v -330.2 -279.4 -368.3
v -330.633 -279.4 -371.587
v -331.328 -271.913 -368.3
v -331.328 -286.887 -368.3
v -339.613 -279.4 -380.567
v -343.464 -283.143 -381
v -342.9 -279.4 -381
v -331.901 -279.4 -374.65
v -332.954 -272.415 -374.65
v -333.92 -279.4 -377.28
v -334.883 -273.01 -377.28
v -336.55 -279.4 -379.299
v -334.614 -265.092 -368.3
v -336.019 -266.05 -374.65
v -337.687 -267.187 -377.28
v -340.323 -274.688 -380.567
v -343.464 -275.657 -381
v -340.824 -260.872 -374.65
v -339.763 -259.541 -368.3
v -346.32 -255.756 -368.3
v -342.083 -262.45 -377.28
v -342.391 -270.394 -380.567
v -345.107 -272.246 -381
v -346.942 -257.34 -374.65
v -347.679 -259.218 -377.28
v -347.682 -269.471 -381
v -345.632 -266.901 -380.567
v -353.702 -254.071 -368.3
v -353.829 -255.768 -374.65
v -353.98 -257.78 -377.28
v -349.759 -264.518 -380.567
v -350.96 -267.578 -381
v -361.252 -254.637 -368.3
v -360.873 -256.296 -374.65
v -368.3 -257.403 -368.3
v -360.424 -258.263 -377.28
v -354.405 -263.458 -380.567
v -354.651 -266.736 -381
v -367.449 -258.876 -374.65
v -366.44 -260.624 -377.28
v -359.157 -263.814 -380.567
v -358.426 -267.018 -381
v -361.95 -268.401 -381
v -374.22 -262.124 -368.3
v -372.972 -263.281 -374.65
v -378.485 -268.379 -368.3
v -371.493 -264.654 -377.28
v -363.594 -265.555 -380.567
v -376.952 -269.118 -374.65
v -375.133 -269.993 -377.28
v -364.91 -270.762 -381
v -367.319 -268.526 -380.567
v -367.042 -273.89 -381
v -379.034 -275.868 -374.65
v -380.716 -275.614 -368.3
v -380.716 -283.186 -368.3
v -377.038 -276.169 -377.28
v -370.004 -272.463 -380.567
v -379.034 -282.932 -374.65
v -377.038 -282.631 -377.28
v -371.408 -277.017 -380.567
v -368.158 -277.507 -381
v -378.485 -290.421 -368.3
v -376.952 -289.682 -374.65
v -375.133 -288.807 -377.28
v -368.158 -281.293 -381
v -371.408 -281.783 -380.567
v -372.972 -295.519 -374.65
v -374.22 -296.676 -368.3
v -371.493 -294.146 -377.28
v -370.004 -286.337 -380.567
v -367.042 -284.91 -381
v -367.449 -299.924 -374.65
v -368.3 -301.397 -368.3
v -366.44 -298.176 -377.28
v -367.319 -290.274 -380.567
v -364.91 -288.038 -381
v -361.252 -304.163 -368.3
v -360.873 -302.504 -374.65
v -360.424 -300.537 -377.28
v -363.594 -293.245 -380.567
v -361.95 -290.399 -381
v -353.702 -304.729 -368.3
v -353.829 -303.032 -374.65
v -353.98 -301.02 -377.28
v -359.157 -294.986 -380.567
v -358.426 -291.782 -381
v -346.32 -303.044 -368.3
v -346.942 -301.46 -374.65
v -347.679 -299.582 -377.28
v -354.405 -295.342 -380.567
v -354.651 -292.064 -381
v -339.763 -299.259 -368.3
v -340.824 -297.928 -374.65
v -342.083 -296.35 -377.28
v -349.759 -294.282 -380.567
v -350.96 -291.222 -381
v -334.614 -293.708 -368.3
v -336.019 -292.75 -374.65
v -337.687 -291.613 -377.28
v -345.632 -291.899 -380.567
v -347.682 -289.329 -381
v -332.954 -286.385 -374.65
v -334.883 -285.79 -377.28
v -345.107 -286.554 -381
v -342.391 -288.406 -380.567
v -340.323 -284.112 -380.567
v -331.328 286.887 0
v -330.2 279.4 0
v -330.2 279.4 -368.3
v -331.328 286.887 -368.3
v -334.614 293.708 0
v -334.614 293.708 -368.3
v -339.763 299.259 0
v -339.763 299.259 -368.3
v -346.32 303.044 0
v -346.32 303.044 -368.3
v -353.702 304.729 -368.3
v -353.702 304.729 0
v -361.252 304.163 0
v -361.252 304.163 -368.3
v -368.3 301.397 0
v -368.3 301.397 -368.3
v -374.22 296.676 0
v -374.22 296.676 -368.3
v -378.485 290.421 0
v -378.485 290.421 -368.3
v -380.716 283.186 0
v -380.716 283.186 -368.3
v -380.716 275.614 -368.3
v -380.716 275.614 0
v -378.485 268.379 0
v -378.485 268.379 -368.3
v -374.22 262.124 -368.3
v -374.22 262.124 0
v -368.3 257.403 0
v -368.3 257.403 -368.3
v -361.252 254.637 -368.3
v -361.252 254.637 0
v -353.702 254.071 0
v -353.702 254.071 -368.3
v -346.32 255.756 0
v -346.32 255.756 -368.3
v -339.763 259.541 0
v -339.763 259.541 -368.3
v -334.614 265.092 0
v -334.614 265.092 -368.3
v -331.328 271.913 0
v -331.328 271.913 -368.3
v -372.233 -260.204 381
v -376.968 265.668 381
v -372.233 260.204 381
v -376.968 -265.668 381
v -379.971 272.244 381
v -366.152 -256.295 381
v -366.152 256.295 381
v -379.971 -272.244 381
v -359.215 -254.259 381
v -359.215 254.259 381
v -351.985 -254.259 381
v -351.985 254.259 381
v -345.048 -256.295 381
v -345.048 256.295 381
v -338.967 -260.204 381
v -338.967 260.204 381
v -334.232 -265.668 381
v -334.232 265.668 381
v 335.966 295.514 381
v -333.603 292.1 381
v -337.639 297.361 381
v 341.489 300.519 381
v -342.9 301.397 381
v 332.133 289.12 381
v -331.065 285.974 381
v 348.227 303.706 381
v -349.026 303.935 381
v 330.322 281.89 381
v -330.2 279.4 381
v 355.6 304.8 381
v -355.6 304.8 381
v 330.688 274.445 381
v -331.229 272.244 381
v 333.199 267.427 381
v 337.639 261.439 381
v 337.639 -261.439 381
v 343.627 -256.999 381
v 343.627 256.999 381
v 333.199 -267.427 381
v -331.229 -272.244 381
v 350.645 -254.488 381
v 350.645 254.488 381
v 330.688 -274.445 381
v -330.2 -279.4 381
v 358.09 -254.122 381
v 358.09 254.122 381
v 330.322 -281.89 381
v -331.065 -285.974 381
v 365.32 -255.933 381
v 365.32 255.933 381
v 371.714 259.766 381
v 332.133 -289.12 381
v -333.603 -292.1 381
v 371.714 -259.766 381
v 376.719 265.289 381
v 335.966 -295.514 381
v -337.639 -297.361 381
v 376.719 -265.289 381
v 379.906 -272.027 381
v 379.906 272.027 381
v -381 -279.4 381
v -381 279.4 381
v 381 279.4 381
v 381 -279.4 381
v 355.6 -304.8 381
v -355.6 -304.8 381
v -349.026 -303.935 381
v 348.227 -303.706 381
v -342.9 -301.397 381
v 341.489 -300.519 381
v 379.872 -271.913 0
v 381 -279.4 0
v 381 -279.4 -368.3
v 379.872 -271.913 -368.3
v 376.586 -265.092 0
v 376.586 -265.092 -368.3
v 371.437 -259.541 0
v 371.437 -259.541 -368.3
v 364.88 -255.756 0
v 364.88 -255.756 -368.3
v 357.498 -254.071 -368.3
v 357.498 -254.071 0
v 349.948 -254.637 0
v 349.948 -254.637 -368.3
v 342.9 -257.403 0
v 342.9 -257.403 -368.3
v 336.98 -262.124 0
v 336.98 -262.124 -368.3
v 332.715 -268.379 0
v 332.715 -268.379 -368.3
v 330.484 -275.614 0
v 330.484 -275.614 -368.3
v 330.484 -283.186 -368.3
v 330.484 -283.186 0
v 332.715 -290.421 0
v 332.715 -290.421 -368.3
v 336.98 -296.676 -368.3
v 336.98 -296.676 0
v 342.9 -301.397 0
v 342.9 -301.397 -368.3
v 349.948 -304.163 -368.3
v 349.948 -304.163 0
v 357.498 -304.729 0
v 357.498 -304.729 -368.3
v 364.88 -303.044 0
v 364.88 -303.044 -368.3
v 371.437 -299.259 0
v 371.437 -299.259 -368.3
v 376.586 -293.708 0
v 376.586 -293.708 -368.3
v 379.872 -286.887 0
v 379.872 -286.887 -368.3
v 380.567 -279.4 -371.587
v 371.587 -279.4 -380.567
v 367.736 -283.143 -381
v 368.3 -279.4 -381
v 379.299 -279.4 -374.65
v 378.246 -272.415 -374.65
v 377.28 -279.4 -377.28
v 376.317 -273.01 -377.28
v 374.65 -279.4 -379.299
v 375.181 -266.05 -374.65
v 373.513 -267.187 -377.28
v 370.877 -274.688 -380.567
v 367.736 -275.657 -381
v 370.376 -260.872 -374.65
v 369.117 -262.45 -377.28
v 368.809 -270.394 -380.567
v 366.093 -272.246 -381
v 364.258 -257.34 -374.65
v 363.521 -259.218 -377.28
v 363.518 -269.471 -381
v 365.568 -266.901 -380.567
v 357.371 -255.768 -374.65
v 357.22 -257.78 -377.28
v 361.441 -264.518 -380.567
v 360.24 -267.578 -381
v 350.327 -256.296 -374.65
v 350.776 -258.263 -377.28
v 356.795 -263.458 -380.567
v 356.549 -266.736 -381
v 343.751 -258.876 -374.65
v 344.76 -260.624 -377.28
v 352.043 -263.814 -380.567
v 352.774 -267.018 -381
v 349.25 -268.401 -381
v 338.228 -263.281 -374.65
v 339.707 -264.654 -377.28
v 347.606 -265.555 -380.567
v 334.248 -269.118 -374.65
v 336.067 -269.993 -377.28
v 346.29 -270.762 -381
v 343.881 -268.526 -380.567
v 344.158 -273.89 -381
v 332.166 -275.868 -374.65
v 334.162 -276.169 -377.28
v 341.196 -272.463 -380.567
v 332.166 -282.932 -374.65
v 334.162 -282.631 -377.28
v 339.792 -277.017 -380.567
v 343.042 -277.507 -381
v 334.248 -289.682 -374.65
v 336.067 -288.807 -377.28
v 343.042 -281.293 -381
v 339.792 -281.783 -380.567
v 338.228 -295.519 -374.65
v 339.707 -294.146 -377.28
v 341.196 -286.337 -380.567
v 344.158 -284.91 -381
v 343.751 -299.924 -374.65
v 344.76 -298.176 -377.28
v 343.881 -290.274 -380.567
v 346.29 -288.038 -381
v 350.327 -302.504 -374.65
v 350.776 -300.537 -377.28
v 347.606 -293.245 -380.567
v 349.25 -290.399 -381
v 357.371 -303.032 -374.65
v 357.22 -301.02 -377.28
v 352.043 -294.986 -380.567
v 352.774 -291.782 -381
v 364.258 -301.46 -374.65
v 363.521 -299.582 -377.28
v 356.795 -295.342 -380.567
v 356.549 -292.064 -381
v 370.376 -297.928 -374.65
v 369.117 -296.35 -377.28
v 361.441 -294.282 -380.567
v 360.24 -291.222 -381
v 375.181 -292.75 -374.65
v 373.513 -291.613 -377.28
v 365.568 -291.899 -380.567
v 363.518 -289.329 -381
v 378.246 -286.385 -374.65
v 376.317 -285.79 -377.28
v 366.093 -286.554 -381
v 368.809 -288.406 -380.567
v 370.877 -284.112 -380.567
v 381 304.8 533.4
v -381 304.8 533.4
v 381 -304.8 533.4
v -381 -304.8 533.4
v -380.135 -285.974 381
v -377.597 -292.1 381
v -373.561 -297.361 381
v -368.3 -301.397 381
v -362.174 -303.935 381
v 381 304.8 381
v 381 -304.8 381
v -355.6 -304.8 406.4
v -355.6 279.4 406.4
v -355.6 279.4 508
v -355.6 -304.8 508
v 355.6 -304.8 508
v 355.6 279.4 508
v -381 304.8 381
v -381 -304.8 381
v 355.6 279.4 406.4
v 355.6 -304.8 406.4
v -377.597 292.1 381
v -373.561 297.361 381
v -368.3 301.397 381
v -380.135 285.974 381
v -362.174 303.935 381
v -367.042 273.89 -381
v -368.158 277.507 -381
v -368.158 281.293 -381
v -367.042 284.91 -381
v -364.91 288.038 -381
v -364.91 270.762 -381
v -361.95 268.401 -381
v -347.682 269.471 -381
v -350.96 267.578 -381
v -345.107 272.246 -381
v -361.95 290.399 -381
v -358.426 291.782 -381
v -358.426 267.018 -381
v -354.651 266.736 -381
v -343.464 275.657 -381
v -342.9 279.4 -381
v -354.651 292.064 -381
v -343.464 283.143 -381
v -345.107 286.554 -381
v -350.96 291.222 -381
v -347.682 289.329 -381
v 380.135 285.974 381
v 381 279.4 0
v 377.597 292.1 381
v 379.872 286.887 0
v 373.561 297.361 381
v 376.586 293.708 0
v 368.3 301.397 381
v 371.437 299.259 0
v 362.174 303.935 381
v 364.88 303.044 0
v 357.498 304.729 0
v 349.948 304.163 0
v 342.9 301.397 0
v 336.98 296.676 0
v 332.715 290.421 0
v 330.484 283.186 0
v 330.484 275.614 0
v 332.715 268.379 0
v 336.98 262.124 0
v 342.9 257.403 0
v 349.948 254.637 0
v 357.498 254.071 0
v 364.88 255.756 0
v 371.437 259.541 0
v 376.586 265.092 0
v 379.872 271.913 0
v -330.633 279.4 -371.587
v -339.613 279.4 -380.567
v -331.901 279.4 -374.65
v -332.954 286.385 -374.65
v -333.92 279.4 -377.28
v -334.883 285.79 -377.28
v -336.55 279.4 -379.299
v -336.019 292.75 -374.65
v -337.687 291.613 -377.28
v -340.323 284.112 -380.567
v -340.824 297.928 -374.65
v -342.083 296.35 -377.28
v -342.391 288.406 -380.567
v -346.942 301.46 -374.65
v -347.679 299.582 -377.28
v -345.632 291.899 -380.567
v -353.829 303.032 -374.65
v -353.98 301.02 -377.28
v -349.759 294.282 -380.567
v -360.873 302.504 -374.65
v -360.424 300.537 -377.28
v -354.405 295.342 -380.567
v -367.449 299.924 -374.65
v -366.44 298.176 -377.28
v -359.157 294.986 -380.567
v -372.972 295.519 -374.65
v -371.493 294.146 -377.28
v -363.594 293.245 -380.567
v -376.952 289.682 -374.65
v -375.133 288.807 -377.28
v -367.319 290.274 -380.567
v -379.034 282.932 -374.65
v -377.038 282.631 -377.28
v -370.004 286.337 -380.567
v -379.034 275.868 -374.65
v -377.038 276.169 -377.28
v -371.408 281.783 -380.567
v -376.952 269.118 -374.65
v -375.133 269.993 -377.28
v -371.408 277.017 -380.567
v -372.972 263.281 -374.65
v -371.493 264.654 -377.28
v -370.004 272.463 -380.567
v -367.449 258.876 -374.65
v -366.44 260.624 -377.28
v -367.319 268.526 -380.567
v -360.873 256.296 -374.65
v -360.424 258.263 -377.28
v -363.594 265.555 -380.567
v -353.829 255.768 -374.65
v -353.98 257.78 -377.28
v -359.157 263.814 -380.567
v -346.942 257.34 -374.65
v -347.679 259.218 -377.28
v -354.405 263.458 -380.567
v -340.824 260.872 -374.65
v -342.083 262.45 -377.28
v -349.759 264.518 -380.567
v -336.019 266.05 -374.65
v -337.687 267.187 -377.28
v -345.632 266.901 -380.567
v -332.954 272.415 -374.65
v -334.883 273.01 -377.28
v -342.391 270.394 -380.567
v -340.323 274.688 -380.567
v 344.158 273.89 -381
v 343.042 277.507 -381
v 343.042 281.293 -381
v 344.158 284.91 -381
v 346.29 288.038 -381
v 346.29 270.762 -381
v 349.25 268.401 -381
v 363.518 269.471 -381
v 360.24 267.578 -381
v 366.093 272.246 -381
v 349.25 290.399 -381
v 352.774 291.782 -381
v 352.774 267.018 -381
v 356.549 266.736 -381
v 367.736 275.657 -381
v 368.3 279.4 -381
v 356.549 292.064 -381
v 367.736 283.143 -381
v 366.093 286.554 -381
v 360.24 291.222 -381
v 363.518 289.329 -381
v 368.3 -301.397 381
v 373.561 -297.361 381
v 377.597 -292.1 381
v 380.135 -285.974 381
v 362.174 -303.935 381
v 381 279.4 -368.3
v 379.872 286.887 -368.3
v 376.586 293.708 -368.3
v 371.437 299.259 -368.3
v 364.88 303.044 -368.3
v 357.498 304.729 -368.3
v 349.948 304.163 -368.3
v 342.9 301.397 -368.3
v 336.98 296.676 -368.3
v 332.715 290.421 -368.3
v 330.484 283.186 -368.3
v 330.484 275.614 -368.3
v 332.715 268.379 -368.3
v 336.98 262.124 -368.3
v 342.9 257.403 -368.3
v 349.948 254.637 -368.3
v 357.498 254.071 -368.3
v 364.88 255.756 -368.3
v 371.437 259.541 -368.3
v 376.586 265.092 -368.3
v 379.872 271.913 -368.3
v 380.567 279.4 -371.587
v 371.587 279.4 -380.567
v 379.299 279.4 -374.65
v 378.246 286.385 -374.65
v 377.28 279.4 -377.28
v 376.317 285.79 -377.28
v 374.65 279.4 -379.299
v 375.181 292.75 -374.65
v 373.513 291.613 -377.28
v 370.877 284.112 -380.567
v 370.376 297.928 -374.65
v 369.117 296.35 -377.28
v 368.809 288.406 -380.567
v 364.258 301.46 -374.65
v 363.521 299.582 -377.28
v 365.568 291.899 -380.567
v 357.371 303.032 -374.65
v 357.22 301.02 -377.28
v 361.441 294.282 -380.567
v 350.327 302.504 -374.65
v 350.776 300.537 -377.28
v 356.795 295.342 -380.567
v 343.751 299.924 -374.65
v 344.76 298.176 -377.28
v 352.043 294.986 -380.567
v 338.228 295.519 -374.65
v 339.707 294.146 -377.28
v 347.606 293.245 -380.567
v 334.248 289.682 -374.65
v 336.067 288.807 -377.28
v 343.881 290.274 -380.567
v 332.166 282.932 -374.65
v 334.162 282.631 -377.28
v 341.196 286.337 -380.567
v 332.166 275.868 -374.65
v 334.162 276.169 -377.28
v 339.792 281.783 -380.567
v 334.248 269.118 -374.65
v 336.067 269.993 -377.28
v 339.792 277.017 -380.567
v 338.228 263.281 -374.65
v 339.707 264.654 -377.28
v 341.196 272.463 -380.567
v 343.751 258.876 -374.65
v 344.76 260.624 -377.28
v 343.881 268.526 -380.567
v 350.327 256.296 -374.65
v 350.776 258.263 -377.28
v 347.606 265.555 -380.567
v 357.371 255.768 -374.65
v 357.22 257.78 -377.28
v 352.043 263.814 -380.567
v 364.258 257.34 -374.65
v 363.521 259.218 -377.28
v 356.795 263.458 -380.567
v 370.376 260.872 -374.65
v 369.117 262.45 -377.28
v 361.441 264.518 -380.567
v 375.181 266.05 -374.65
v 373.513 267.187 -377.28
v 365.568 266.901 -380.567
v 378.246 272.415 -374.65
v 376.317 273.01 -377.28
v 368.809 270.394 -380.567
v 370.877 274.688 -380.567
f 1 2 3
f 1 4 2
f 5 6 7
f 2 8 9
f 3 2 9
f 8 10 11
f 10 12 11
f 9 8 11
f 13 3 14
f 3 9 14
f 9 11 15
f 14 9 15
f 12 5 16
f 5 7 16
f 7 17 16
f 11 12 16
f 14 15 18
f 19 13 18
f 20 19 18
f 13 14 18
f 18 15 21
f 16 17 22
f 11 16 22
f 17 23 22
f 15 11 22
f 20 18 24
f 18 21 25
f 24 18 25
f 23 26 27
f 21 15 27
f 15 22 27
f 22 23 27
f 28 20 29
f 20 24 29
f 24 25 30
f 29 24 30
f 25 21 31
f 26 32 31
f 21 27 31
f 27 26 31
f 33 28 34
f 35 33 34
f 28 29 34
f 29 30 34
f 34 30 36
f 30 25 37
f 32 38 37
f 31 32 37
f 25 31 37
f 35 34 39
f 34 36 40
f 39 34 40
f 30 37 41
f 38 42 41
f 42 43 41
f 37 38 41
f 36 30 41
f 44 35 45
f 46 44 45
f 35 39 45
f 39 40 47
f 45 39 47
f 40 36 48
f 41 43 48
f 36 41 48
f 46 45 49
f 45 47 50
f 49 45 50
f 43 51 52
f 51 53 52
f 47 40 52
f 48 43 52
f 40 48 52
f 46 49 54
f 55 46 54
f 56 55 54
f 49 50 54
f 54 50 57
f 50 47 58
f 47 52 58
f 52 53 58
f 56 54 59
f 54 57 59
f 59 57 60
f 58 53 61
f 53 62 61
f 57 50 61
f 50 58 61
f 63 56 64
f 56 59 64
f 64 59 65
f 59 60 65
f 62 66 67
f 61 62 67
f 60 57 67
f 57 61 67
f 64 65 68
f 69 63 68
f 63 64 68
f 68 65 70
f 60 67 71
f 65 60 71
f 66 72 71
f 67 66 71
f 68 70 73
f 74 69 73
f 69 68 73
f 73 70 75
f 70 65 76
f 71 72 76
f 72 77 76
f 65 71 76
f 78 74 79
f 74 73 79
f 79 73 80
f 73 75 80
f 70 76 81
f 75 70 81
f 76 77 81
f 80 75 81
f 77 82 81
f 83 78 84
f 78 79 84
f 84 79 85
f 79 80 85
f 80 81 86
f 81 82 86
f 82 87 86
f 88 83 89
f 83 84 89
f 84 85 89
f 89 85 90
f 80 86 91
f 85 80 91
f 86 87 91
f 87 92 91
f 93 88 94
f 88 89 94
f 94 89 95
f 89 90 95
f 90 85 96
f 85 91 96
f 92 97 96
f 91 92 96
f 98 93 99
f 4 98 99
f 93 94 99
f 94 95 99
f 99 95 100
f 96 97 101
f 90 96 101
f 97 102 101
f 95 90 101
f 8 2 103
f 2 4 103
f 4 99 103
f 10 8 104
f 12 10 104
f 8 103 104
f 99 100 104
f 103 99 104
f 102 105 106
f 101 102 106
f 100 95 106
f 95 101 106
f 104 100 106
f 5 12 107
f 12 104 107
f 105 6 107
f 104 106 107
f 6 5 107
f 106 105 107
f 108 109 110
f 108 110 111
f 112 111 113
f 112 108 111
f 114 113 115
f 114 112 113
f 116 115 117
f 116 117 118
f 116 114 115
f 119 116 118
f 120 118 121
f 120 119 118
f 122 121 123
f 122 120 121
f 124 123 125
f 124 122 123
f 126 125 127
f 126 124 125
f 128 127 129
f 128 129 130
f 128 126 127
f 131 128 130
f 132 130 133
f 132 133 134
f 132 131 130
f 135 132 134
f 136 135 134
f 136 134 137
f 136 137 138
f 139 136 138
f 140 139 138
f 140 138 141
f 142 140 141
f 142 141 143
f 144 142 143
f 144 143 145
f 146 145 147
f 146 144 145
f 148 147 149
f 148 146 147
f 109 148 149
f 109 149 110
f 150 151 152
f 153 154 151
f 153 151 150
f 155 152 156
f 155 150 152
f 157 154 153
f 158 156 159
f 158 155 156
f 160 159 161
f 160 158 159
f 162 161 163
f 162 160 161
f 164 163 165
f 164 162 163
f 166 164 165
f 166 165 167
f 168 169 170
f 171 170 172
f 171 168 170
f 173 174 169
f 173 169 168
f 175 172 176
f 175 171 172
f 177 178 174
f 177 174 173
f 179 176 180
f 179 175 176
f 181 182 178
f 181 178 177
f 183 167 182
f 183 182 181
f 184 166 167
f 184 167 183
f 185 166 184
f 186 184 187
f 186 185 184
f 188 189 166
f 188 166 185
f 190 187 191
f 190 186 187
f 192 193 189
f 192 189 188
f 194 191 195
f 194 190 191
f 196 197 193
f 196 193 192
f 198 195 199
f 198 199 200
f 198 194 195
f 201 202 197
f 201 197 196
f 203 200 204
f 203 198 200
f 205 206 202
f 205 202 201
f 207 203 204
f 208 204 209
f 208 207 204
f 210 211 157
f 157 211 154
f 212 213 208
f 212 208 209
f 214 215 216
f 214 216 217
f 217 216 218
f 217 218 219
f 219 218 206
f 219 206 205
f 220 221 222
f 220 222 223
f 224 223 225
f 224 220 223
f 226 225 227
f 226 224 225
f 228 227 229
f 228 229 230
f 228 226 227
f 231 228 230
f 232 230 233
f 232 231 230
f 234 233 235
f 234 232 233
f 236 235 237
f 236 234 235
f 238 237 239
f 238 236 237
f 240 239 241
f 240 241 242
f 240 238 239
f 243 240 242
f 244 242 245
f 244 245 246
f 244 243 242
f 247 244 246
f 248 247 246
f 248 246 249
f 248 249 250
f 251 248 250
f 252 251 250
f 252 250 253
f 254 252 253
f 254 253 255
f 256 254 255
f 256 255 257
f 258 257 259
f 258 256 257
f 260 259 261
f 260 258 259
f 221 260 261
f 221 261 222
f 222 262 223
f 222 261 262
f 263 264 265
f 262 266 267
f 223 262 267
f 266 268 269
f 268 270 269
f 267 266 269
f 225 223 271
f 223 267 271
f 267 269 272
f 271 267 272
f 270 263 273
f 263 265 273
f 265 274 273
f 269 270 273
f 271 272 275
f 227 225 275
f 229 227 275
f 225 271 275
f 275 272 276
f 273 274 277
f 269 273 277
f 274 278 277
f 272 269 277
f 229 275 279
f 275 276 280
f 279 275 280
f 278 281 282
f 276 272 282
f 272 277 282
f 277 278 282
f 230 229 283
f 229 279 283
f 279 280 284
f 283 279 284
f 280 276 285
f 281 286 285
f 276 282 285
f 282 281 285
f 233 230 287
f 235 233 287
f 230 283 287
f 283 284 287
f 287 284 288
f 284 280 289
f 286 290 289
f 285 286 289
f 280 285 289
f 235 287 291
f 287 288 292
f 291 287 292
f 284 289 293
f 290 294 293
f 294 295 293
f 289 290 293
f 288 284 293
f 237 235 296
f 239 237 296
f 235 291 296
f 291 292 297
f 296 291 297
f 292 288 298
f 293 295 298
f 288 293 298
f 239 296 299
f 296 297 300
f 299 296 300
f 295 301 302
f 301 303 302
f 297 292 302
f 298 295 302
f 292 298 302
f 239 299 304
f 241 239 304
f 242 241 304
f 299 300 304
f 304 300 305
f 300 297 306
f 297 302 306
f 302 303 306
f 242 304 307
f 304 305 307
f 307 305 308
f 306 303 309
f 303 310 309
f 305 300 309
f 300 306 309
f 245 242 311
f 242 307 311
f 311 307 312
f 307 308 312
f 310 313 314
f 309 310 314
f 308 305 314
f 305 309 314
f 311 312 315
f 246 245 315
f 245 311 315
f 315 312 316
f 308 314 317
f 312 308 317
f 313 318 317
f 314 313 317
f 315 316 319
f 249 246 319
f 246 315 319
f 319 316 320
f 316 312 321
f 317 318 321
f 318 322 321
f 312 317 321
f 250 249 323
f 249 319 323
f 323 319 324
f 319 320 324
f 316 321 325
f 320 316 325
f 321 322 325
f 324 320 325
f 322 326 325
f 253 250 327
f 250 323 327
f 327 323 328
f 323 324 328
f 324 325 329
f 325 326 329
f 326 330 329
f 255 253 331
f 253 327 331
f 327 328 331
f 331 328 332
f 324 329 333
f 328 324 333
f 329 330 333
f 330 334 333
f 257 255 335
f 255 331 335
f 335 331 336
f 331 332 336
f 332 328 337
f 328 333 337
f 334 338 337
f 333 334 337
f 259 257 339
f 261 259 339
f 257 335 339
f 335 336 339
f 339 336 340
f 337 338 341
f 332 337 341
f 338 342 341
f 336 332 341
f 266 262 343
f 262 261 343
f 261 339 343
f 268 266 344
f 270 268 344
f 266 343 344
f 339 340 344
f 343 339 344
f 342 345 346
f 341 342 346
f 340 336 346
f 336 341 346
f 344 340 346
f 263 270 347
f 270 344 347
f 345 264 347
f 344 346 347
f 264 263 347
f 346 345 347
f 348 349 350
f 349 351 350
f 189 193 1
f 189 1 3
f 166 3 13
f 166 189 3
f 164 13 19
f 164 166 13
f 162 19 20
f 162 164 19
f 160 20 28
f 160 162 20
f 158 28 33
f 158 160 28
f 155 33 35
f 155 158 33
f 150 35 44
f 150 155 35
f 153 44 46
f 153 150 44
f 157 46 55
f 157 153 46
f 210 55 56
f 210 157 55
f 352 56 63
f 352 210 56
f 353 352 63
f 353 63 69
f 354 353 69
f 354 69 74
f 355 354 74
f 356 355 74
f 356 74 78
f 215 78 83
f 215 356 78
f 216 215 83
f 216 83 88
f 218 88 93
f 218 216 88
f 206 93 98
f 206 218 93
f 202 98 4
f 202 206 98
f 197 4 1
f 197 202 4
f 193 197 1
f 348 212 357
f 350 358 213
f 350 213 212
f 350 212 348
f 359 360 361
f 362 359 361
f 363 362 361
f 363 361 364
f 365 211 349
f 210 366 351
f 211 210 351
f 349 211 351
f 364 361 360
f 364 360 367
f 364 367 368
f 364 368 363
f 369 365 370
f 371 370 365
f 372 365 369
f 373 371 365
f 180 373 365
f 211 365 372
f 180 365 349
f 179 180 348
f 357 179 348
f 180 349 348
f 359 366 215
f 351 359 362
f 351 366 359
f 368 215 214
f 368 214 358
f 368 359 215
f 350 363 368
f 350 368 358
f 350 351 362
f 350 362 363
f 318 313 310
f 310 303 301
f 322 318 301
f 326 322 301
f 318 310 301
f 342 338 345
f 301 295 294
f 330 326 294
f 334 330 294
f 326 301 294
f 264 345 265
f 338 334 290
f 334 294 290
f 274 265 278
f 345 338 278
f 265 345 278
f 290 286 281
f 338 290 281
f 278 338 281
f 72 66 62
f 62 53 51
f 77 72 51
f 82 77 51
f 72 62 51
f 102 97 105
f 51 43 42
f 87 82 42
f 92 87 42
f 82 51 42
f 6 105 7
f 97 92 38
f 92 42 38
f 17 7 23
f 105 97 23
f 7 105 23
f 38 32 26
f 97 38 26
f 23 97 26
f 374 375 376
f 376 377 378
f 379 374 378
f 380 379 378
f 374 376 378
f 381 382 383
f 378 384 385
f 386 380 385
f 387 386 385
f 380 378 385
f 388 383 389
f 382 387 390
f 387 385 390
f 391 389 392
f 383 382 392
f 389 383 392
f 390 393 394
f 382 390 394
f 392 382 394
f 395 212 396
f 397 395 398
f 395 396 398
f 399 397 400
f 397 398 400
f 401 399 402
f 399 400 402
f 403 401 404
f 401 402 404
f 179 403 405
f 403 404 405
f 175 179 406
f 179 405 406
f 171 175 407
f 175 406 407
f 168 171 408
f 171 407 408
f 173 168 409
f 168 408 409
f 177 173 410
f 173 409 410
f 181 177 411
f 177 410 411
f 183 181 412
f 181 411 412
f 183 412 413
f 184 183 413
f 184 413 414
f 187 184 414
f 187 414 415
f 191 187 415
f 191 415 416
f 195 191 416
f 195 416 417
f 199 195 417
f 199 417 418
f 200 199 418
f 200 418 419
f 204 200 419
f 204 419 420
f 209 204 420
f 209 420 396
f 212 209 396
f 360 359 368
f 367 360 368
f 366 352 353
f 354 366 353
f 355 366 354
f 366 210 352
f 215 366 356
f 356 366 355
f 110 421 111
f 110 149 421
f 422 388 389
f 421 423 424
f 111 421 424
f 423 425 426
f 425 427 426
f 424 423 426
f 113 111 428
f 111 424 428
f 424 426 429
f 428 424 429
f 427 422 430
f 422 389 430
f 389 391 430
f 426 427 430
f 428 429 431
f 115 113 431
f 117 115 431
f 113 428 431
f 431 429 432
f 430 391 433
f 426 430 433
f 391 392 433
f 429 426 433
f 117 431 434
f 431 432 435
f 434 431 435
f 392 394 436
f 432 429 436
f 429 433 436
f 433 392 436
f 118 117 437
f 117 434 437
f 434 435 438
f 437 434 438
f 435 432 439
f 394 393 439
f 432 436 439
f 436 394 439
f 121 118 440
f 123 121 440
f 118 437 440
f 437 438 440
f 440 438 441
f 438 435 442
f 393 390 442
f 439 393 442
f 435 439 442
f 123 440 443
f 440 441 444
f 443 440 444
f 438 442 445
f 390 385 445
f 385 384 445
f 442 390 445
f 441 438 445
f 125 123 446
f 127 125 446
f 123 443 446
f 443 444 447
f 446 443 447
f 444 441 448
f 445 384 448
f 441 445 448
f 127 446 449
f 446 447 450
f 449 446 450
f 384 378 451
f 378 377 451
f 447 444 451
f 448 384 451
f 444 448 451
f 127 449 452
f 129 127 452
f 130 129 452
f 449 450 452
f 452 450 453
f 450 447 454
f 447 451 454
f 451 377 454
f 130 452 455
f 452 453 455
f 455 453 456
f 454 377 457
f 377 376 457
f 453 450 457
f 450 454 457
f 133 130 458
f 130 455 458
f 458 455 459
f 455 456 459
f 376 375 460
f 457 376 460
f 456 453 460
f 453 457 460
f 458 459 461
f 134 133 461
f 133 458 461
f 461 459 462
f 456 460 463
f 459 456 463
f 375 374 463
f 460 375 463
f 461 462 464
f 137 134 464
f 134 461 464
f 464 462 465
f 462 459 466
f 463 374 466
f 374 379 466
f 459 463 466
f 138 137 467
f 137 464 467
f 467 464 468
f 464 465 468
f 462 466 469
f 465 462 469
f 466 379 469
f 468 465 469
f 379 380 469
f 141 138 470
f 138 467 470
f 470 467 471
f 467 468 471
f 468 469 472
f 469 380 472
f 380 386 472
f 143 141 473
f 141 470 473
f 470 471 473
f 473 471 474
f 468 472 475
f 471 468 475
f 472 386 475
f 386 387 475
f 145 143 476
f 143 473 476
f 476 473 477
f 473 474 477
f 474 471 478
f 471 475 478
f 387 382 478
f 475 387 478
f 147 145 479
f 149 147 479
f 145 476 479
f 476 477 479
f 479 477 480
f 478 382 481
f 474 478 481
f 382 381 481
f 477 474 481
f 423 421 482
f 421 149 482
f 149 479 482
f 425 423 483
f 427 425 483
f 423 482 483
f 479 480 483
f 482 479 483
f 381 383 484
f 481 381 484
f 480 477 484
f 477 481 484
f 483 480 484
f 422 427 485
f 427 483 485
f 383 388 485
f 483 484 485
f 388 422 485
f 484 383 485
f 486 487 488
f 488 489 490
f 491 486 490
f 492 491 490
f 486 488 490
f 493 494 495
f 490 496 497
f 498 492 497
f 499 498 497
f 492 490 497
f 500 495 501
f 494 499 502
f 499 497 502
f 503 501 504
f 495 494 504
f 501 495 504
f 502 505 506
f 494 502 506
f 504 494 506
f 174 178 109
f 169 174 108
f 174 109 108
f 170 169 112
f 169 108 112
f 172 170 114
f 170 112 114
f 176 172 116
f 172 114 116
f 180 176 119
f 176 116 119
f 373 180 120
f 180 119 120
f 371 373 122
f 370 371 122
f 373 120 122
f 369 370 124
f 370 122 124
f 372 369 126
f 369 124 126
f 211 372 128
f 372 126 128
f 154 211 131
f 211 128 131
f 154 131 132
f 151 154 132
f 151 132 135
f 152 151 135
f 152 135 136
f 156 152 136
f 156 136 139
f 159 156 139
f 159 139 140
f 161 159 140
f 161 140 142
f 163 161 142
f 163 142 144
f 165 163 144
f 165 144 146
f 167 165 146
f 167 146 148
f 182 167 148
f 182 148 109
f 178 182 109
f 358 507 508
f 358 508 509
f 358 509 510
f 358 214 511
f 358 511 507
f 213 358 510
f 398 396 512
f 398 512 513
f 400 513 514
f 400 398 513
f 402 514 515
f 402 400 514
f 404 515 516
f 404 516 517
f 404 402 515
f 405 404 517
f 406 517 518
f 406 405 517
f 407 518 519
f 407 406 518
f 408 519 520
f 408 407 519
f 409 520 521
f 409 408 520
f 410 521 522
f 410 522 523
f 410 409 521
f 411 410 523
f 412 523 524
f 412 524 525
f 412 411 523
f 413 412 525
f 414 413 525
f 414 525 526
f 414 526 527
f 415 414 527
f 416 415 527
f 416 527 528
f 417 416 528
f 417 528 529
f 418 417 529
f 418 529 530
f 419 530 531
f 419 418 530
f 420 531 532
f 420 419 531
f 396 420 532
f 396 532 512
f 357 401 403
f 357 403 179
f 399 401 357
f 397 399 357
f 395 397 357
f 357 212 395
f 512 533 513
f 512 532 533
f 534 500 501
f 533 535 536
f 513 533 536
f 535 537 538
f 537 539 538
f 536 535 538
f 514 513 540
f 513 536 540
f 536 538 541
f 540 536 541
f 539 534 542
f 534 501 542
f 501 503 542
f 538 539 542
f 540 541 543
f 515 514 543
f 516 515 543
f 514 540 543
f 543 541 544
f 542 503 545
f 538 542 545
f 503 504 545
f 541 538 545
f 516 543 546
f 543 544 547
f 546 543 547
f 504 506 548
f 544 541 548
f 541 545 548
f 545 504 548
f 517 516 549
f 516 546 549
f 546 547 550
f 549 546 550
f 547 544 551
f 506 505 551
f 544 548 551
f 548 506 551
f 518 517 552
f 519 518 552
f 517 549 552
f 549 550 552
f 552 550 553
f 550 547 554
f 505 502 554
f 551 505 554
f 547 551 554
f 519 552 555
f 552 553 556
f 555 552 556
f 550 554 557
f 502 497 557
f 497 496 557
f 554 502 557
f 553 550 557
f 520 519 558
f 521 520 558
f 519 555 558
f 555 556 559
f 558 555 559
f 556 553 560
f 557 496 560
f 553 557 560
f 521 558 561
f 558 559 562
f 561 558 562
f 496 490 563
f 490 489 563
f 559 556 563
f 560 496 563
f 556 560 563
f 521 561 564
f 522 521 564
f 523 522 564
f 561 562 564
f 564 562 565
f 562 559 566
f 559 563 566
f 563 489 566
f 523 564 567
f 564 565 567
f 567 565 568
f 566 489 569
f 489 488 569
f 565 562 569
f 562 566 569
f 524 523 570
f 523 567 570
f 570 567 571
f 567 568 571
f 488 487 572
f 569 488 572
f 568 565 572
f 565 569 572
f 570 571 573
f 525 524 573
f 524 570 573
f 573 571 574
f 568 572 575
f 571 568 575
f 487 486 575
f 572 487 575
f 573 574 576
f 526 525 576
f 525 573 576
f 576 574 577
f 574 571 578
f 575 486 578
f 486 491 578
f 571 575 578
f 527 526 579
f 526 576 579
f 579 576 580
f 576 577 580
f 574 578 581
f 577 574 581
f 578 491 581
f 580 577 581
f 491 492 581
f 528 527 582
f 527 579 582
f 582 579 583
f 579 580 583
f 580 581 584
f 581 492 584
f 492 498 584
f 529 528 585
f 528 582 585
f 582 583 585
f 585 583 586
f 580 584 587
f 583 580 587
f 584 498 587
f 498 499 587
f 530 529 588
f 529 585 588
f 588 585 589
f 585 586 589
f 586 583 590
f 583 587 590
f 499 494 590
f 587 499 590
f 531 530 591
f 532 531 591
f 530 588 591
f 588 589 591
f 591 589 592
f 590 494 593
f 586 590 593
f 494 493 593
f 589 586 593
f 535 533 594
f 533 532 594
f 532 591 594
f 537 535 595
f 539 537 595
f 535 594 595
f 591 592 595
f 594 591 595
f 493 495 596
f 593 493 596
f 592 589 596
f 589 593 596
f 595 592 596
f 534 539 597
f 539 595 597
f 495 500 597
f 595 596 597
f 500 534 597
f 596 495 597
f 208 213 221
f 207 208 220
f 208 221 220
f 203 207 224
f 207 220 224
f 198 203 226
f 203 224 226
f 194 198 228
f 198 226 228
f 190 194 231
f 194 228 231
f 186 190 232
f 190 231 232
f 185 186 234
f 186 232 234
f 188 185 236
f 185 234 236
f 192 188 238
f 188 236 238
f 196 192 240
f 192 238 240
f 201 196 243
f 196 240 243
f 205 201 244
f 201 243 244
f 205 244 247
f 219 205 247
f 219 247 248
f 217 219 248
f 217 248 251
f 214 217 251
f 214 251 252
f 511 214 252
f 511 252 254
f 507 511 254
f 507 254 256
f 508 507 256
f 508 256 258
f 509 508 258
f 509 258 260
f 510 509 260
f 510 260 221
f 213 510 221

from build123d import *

# Parameters (mm, degrees)
F0_W     = 762
F0_H     = 152.4
F1_DEPTH = 304.8
F2_T     = -25.4
F3_R     = 25.4
F4_DEPTH = 381
F5_R     = 12.7


with BuildPart() as f1:
    # F0 (on Front) → F1 (new body, symmetric)
    with BuildSketch(Plane.XZ):
        with Locations((0, 457.2)):
            Rectangle(F0_W, F0_H)
    extrude(amount=F1_DEPTH, both=True)

    # F2
    f2_openings = [f1.faces().sort_by_distance(p)[0] for p in [
        (0, -304.8, 457.2),
    ]]
    offset(amount=F2_T, openings=f2_openings)

    # F3 (on Top) → F4 (join, symmetric)
    with BuildSketch(Plane.XY):
        with Locations((-355.6, 279.4)):
            Circle(F3_R)
        with Locations((355.6, 279.4)):
            Circle(F3_R)
        with Locations((355.6, -279.4)):
            Circle(F3_R)
        with Locations((-355.6, -279.4)):
            Circle(F3_R)
    extrude(amount=F4_DEPTH, both=True)

    # F5
    f5_edges = [f1.edges().sort_by_distance(p)[0] for p in [
        (-381, 279.4, -381),
        (-381, -279.4, -381),
        (330.2, -279.4, -381),
        (330.2, 279.4, -381),
    ]]
    fillet(f5_edges, radius=F5_R)


solid = f1.part
